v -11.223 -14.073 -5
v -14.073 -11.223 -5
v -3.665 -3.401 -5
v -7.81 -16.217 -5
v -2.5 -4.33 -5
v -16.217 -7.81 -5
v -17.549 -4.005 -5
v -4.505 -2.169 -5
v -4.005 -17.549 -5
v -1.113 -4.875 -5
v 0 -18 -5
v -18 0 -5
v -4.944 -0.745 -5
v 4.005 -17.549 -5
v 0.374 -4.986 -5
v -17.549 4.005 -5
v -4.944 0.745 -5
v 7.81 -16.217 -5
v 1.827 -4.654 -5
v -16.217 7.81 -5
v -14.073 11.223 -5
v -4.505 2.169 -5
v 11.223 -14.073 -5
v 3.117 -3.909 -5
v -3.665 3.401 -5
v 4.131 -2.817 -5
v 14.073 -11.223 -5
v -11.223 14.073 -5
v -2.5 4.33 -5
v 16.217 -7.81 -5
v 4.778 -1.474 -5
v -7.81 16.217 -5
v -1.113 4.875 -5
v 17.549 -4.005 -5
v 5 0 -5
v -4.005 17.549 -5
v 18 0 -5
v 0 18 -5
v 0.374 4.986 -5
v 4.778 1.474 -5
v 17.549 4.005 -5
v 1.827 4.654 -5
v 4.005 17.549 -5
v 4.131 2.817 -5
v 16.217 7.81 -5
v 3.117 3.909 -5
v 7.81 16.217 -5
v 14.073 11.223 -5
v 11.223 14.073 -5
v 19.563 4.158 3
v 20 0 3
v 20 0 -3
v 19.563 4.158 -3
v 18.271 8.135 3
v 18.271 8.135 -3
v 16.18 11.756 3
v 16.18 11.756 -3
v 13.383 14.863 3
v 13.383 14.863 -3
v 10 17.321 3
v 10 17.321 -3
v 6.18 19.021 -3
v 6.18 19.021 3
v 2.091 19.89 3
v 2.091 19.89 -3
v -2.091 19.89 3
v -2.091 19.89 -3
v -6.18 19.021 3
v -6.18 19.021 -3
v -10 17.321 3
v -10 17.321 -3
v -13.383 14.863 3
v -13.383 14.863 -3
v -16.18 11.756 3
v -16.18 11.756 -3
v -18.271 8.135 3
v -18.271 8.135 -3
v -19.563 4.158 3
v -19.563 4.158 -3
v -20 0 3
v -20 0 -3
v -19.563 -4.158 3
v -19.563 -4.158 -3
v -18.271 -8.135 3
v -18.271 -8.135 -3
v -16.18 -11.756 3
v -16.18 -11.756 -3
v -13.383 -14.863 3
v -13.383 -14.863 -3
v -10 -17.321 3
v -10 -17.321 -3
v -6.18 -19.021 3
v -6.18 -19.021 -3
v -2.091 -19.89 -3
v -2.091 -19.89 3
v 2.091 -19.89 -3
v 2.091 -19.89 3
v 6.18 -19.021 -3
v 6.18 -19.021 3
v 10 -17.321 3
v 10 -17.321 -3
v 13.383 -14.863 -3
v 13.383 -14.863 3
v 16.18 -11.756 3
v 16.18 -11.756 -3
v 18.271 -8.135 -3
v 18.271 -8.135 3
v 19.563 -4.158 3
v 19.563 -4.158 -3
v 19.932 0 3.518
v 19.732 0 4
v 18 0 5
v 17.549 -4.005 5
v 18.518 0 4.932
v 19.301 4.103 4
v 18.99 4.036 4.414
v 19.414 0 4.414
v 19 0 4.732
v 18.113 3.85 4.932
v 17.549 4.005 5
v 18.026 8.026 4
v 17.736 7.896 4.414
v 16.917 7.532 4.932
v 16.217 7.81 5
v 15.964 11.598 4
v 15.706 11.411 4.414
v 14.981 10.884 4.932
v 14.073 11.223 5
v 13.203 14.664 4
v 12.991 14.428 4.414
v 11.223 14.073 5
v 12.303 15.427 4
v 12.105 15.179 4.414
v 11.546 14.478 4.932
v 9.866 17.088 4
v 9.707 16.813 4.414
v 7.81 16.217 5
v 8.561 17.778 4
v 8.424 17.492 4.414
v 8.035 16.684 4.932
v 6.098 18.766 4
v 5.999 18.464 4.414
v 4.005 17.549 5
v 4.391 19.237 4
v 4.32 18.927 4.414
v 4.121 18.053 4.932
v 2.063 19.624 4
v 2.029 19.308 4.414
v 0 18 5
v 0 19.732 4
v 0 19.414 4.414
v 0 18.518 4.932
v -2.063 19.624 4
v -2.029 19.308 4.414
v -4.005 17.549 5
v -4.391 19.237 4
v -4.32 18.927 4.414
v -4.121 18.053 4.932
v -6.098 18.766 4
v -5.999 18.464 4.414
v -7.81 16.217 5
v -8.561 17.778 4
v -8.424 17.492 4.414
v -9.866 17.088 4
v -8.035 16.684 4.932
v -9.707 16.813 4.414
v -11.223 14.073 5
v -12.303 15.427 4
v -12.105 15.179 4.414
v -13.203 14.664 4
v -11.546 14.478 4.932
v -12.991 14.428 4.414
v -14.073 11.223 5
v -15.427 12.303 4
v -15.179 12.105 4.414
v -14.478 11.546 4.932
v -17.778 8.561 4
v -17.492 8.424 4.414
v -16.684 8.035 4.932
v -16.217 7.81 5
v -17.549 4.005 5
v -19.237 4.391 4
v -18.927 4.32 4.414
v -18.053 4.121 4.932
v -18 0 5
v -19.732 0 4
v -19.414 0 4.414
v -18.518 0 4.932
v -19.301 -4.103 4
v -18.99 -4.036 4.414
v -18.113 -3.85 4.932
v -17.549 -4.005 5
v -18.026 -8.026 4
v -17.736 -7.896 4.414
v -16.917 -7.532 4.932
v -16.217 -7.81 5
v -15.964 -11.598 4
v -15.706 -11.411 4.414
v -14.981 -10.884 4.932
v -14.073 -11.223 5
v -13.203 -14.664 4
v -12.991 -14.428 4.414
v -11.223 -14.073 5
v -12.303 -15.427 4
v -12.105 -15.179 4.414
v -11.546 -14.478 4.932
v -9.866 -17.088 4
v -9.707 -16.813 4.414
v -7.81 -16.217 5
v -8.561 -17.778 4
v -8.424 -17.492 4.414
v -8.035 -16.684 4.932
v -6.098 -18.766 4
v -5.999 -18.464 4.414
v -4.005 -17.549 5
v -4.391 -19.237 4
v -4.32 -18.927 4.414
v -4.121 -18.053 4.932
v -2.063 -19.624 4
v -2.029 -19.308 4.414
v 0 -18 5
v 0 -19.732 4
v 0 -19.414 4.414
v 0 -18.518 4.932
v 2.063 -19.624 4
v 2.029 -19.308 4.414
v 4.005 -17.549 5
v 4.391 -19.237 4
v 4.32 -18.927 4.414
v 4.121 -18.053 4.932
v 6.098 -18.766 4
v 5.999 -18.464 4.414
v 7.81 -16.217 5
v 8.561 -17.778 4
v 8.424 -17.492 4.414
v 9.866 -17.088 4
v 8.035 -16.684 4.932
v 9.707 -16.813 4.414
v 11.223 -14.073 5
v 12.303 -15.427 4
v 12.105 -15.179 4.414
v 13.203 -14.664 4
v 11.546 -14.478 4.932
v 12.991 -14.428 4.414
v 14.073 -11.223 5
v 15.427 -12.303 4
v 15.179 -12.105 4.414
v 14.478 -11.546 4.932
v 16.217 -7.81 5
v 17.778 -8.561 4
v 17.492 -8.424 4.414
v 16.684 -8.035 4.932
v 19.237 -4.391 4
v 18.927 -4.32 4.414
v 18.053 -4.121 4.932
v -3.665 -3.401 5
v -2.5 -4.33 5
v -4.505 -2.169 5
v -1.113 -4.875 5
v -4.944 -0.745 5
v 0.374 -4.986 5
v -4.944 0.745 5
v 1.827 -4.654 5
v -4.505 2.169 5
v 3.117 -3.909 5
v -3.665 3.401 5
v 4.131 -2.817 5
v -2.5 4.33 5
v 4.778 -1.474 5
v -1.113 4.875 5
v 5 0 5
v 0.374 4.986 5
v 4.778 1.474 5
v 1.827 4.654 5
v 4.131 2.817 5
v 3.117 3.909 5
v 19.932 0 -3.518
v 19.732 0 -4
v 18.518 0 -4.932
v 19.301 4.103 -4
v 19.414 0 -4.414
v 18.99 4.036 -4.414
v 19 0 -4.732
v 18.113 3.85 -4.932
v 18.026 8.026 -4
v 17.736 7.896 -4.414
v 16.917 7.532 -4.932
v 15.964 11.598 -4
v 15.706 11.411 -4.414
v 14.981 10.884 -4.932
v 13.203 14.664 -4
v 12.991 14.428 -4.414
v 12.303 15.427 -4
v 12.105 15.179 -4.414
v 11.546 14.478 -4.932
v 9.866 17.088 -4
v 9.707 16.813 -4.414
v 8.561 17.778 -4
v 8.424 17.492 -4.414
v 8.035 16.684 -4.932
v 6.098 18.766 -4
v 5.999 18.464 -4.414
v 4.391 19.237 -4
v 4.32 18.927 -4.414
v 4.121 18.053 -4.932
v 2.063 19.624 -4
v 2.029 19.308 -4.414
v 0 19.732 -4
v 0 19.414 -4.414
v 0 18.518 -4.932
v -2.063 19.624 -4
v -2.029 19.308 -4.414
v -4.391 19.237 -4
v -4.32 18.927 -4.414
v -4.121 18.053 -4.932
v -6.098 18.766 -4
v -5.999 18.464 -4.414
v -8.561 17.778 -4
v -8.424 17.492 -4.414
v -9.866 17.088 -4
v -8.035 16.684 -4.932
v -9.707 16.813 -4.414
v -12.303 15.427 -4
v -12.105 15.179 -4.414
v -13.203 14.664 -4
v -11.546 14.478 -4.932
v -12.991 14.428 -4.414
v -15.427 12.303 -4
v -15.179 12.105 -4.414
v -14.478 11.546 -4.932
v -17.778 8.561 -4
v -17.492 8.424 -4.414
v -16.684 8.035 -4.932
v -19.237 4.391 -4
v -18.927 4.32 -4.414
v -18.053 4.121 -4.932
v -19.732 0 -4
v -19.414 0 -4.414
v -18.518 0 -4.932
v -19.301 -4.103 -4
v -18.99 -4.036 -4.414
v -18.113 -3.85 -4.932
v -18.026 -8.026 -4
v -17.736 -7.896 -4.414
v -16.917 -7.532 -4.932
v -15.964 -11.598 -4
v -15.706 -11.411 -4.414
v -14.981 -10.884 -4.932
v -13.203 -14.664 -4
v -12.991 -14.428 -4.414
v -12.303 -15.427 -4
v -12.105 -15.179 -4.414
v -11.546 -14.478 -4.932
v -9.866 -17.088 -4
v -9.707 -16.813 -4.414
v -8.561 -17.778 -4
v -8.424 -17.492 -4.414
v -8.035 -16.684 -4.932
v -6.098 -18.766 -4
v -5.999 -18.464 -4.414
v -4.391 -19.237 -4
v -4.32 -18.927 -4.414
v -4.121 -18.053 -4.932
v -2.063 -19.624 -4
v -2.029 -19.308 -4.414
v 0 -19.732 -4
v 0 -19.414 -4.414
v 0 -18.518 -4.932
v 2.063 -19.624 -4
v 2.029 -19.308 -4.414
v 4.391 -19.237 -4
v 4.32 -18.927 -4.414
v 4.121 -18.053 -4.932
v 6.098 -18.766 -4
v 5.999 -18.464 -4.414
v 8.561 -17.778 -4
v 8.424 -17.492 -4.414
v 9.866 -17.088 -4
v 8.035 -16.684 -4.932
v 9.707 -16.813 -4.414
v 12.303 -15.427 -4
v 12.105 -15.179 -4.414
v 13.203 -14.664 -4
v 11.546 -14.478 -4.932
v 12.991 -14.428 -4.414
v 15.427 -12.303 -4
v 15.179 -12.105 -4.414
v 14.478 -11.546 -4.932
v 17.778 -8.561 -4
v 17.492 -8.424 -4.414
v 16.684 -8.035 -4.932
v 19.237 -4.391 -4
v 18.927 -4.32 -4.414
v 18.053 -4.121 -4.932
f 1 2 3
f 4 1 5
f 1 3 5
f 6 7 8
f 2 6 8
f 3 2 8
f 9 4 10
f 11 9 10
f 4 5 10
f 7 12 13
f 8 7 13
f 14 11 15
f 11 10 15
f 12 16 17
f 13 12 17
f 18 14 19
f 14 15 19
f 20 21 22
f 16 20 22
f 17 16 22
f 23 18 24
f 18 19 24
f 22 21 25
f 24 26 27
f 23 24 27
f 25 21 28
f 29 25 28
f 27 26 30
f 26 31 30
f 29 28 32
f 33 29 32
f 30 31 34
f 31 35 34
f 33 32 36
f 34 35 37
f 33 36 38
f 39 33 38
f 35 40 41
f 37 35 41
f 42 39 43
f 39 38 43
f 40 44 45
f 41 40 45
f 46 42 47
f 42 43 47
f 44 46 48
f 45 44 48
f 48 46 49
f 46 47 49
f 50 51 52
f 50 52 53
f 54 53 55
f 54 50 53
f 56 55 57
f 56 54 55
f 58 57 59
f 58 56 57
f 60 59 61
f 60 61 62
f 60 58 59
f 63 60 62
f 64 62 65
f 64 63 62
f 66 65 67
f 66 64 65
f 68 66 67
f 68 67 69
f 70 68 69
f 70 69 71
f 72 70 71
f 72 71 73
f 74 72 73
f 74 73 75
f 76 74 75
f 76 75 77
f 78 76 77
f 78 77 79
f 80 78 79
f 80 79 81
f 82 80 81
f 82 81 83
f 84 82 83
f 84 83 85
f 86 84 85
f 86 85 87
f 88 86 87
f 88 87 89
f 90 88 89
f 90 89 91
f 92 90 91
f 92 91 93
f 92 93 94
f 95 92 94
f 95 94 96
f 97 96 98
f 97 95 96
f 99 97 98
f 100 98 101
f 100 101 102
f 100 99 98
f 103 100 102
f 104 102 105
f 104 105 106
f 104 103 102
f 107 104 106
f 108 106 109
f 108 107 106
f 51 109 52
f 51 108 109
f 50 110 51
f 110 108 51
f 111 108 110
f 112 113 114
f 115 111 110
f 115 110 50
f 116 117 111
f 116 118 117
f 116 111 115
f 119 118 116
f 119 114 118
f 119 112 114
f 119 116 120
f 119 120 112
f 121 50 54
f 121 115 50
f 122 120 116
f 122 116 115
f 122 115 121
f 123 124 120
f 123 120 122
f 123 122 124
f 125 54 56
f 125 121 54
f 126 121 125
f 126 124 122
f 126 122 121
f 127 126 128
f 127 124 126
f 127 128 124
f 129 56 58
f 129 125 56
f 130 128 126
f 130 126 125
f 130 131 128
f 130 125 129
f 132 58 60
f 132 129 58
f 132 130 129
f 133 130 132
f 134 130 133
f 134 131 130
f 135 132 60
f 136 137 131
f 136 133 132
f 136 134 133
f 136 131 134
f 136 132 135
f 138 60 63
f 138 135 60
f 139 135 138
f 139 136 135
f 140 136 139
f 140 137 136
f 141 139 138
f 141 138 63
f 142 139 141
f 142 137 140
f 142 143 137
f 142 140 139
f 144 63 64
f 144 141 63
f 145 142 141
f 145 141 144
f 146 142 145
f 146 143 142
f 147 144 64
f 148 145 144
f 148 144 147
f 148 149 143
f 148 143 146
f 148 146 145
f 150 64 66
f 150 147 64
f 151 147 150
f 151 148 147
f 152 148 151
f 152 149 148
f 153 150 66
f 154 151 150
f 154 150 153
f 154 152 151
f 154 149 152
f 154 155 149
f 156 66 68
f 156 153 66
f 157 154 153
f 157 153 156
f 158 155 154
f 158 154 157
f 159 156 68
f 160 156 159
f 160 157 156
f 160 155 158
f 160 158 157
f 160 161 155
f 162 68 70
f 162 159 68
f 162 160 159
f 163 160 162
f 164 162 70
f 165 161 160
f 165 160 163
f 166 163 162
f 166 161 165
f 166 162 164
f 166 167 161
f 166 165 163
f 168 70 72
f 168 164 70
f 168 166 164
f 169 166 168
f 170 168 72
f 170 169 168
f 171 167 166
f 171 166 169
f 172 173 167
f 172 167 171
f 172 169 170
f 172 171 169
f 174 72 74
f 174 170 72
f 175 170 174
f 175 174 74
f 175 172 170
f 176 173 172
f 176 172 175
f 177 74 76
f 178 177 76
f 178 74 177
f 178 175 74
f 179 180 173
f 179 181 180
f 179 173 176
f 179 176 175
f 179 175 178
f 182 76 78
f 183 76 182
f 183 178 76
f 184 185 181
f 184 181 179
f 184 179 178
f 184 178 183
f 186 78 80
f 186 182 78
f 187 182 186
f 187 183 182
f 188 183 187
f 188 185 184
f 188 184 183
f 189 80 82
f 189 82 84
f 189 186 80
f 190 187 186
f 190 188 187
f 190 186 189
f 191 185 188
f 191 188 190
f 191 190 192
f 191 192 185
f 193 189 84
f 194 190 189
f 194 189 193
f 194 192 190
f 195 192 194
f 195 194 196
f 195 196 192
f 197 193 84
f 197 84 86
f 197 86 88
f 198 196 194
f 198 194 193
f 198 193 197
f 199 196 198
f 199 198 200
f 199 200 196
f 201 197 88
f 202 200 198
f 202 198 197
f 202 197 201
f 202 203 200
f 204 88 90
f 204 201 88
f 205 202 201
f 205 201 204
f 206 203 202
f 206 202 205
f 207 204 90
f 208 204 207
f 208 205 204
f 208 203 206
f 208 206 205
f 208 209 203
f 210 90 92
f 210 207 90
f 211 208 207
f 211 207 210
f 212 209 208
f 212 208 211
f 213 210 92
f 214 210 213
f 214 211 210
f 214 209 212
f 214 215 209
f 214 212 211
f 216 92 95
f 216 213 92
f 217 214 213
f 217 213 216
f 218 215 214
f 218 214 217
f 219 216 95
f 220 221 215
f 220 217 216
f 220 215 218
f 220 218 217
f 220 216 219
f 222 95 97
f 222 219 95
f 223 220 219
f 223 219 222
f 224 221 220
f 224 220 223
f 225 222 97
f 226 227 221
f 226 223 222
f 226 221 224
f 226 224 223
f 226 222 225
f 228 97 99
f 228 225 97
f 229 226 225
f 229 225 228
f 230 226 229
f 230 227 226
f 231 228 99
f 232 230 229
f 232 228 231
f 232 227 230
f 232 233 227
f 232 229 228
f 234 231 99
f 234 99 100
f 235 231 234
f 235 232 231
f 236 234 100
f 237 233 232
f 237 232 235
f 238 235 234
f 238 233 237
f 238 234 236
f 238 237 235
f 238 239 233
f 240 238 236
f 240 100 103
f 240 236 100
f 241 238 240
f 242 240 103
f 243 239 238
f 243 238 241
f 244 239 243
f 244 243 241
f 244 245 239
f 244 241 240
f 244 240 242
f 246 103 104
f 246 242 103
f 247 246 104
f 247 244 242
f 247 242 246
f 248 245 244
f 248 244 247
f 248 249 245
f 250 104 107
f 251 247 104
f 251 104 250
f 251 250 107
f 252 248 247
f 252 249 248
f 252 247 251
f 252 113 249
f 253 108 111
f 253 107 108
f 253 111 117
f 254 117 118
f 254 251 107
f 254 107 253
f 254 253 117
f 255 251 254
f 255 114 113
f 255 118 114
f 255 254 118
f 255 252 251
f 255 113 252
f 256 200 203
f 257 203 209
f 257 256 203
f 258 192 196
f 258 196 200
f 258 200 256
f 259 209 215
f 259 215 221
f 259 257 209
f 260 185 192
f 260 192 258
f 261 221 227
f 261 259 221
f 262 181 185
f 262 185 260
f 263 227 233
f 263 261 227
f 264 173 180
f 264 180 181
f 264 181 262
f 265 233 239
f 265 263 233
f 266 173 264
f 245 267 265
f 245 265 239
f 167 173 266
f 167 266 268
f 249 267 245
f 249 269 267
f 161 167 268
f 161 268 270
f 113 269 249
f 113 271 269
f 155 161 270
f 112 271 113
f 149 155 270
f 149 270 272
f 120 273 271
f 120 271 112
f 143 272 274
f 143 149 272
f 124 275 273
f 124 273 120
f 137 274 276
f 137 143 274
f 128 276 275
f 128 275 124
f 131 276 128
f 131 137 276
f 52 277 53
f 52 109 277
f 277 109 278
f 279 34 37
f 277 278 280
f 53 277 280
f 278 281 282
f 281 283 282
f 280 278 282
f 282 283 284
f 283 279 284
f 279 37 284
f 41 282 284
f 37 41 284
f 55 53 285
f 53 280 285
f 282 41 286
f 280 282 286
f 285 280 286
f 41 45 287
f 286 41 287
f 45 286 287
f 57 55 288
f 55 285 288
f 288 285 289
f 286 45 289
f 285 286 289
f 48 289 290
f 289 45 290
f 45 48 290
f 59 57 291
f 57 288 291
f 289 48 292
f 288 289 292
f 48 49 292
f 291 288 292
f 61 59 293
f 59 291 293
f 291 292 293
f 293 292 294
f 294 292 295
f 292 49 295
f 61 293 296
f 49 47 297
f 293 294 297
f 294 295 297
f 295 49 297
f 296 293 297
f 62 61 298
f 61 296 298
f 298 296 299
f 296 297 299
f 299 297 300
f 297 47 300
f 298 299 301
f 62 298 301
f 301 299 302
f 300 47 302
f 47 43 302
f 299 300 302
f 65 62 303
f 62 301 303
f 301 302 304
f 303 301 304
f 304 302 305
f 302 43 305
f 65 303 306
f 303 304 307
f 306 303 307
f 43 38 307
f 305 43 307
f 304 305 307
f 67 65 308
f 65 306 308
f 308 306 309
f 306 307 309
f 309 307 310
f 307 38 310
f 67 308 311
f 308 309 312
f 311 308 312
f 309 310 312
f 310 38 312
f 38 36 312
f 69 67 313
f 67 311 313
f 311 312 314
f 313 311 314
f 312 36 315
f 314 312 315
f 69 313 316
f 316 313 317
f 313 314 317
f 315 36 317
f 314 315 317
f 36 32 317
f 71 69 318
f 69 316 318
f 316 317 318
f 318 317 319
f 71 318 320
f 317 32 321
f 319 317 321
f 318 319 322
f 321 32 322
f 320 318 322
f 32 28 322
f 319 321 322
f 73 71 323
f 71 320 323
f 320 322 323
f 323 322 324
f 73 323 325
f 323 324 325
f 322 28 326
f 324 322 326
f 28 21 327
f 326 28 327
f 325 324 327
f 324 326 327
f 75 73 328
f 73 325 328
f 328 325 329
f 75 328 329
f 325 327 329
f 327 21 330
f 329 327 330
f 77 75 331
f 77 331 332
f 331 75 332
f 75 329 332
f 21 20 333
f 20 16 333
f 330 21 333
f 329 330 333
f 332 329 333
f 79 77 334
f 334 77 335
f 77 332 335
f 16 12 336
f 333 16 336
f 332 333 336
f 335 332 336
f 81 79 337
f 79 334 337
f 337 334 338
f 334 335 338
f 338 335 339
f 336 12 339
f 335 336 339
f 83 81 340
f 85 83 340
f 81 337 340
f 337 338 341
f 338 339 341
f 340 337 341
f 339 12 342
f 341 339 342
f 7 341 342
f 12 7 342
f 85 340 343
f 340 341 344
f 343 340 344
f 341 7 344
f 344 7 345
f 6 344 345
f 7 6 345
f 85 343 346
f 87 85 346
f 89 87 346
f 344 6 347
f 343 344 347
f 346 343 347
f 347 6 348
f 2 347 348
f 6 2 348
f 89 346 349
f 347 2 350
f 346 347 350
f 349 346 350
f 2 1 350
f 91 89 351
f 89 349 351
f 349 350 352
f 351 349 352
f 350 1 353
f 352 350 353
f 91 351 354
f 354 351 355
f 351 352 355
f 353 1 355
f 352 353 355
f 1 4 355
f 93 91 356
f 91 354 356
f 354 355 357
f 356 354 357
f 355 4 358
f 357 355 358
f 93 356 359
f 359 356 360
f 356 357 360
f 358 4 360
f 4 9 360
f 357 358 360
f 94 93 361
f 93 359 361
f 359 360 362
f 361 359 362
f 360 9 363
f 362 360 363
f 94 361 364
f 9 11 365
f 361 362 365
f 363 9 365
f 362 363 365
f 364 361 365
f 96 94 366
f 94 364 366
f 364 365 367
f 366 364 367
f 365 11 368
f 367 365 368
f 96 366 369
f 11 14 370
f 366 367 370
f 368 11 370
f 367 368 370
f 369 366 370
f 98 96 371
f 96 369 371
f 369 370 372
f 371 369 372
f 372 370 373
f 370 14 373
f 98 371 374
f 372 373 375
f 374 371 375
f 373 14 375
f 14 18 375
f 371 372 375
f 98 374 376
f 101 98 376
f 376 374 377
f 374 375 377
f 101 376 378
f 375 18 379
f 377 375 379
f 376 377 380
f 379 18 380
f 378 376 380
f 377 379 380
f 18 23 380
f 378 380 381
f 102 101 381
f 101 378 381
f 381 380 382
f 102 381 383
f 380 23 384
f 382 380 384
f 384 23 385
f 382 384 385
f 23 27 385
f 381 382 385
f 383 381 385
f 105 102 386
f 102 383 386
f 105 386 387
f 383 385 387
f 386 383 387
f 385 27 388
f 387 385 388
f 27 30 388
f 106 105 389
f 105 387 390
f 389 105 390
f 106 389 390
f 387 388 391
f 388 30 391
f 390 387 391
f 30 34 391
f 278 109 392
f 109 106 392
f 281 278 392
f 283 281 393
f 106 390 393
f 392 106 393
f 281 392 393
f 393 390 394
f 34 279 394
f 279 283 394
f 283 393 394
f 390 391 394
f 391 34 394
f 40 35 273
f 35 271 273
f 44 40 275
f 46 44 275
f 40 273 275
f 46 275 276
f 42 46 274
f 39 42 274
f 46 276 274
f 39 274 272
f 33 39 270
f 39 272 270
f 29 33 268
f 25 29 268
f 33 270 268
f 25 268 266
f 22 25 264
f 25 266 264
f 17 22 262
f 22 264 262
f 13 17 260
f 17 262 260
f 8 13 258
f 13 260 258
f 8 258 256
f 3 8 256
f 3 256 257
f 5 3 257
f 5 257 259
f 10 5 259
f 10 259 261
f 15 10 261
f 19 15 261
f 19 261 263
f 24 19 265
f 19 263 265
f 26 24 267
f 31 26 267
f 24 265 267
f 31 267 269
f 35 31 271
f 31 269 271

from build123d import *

# Parameters (mm, degrees)
ESBO_O1_R                = 20
RESSALTO_EXTRUS_O1_DEPTH = 5
ESBO_O2_R                = 5
CORTE_EXTRUS_O2_DEPTH    = 5
FILETE3_R                = 2


with BuildPart() as part:
    # Esboço1 → Ressalto-extrusão1 (new, symmetric)
    with BuildSketch(Plane.XY):
        Circle(ESBO_O1_R)
    extrude(amount=RESSALTO_EXTRUS_O1_DEPTH, both=True)

    # Esboço2 → Corte-extrusão2 (cut, symmetric)
    with BuildSketch(Plane.XY):
        Circle(ESBO_O2_R)
    extrude(amount=CORTE_EXTRUS_O2_DEPTH, both=True, mode=Mode.SUBTRACT)

    # Filete3
    filete3_edges = [part.edges().sort_by_distance(p)[0] for p in [
        (-20, 0, -5),
        (-20, 0, 5),
    ]]
    fillet(filete3_edges, radius=FILETE3_R)


solid = part.part
